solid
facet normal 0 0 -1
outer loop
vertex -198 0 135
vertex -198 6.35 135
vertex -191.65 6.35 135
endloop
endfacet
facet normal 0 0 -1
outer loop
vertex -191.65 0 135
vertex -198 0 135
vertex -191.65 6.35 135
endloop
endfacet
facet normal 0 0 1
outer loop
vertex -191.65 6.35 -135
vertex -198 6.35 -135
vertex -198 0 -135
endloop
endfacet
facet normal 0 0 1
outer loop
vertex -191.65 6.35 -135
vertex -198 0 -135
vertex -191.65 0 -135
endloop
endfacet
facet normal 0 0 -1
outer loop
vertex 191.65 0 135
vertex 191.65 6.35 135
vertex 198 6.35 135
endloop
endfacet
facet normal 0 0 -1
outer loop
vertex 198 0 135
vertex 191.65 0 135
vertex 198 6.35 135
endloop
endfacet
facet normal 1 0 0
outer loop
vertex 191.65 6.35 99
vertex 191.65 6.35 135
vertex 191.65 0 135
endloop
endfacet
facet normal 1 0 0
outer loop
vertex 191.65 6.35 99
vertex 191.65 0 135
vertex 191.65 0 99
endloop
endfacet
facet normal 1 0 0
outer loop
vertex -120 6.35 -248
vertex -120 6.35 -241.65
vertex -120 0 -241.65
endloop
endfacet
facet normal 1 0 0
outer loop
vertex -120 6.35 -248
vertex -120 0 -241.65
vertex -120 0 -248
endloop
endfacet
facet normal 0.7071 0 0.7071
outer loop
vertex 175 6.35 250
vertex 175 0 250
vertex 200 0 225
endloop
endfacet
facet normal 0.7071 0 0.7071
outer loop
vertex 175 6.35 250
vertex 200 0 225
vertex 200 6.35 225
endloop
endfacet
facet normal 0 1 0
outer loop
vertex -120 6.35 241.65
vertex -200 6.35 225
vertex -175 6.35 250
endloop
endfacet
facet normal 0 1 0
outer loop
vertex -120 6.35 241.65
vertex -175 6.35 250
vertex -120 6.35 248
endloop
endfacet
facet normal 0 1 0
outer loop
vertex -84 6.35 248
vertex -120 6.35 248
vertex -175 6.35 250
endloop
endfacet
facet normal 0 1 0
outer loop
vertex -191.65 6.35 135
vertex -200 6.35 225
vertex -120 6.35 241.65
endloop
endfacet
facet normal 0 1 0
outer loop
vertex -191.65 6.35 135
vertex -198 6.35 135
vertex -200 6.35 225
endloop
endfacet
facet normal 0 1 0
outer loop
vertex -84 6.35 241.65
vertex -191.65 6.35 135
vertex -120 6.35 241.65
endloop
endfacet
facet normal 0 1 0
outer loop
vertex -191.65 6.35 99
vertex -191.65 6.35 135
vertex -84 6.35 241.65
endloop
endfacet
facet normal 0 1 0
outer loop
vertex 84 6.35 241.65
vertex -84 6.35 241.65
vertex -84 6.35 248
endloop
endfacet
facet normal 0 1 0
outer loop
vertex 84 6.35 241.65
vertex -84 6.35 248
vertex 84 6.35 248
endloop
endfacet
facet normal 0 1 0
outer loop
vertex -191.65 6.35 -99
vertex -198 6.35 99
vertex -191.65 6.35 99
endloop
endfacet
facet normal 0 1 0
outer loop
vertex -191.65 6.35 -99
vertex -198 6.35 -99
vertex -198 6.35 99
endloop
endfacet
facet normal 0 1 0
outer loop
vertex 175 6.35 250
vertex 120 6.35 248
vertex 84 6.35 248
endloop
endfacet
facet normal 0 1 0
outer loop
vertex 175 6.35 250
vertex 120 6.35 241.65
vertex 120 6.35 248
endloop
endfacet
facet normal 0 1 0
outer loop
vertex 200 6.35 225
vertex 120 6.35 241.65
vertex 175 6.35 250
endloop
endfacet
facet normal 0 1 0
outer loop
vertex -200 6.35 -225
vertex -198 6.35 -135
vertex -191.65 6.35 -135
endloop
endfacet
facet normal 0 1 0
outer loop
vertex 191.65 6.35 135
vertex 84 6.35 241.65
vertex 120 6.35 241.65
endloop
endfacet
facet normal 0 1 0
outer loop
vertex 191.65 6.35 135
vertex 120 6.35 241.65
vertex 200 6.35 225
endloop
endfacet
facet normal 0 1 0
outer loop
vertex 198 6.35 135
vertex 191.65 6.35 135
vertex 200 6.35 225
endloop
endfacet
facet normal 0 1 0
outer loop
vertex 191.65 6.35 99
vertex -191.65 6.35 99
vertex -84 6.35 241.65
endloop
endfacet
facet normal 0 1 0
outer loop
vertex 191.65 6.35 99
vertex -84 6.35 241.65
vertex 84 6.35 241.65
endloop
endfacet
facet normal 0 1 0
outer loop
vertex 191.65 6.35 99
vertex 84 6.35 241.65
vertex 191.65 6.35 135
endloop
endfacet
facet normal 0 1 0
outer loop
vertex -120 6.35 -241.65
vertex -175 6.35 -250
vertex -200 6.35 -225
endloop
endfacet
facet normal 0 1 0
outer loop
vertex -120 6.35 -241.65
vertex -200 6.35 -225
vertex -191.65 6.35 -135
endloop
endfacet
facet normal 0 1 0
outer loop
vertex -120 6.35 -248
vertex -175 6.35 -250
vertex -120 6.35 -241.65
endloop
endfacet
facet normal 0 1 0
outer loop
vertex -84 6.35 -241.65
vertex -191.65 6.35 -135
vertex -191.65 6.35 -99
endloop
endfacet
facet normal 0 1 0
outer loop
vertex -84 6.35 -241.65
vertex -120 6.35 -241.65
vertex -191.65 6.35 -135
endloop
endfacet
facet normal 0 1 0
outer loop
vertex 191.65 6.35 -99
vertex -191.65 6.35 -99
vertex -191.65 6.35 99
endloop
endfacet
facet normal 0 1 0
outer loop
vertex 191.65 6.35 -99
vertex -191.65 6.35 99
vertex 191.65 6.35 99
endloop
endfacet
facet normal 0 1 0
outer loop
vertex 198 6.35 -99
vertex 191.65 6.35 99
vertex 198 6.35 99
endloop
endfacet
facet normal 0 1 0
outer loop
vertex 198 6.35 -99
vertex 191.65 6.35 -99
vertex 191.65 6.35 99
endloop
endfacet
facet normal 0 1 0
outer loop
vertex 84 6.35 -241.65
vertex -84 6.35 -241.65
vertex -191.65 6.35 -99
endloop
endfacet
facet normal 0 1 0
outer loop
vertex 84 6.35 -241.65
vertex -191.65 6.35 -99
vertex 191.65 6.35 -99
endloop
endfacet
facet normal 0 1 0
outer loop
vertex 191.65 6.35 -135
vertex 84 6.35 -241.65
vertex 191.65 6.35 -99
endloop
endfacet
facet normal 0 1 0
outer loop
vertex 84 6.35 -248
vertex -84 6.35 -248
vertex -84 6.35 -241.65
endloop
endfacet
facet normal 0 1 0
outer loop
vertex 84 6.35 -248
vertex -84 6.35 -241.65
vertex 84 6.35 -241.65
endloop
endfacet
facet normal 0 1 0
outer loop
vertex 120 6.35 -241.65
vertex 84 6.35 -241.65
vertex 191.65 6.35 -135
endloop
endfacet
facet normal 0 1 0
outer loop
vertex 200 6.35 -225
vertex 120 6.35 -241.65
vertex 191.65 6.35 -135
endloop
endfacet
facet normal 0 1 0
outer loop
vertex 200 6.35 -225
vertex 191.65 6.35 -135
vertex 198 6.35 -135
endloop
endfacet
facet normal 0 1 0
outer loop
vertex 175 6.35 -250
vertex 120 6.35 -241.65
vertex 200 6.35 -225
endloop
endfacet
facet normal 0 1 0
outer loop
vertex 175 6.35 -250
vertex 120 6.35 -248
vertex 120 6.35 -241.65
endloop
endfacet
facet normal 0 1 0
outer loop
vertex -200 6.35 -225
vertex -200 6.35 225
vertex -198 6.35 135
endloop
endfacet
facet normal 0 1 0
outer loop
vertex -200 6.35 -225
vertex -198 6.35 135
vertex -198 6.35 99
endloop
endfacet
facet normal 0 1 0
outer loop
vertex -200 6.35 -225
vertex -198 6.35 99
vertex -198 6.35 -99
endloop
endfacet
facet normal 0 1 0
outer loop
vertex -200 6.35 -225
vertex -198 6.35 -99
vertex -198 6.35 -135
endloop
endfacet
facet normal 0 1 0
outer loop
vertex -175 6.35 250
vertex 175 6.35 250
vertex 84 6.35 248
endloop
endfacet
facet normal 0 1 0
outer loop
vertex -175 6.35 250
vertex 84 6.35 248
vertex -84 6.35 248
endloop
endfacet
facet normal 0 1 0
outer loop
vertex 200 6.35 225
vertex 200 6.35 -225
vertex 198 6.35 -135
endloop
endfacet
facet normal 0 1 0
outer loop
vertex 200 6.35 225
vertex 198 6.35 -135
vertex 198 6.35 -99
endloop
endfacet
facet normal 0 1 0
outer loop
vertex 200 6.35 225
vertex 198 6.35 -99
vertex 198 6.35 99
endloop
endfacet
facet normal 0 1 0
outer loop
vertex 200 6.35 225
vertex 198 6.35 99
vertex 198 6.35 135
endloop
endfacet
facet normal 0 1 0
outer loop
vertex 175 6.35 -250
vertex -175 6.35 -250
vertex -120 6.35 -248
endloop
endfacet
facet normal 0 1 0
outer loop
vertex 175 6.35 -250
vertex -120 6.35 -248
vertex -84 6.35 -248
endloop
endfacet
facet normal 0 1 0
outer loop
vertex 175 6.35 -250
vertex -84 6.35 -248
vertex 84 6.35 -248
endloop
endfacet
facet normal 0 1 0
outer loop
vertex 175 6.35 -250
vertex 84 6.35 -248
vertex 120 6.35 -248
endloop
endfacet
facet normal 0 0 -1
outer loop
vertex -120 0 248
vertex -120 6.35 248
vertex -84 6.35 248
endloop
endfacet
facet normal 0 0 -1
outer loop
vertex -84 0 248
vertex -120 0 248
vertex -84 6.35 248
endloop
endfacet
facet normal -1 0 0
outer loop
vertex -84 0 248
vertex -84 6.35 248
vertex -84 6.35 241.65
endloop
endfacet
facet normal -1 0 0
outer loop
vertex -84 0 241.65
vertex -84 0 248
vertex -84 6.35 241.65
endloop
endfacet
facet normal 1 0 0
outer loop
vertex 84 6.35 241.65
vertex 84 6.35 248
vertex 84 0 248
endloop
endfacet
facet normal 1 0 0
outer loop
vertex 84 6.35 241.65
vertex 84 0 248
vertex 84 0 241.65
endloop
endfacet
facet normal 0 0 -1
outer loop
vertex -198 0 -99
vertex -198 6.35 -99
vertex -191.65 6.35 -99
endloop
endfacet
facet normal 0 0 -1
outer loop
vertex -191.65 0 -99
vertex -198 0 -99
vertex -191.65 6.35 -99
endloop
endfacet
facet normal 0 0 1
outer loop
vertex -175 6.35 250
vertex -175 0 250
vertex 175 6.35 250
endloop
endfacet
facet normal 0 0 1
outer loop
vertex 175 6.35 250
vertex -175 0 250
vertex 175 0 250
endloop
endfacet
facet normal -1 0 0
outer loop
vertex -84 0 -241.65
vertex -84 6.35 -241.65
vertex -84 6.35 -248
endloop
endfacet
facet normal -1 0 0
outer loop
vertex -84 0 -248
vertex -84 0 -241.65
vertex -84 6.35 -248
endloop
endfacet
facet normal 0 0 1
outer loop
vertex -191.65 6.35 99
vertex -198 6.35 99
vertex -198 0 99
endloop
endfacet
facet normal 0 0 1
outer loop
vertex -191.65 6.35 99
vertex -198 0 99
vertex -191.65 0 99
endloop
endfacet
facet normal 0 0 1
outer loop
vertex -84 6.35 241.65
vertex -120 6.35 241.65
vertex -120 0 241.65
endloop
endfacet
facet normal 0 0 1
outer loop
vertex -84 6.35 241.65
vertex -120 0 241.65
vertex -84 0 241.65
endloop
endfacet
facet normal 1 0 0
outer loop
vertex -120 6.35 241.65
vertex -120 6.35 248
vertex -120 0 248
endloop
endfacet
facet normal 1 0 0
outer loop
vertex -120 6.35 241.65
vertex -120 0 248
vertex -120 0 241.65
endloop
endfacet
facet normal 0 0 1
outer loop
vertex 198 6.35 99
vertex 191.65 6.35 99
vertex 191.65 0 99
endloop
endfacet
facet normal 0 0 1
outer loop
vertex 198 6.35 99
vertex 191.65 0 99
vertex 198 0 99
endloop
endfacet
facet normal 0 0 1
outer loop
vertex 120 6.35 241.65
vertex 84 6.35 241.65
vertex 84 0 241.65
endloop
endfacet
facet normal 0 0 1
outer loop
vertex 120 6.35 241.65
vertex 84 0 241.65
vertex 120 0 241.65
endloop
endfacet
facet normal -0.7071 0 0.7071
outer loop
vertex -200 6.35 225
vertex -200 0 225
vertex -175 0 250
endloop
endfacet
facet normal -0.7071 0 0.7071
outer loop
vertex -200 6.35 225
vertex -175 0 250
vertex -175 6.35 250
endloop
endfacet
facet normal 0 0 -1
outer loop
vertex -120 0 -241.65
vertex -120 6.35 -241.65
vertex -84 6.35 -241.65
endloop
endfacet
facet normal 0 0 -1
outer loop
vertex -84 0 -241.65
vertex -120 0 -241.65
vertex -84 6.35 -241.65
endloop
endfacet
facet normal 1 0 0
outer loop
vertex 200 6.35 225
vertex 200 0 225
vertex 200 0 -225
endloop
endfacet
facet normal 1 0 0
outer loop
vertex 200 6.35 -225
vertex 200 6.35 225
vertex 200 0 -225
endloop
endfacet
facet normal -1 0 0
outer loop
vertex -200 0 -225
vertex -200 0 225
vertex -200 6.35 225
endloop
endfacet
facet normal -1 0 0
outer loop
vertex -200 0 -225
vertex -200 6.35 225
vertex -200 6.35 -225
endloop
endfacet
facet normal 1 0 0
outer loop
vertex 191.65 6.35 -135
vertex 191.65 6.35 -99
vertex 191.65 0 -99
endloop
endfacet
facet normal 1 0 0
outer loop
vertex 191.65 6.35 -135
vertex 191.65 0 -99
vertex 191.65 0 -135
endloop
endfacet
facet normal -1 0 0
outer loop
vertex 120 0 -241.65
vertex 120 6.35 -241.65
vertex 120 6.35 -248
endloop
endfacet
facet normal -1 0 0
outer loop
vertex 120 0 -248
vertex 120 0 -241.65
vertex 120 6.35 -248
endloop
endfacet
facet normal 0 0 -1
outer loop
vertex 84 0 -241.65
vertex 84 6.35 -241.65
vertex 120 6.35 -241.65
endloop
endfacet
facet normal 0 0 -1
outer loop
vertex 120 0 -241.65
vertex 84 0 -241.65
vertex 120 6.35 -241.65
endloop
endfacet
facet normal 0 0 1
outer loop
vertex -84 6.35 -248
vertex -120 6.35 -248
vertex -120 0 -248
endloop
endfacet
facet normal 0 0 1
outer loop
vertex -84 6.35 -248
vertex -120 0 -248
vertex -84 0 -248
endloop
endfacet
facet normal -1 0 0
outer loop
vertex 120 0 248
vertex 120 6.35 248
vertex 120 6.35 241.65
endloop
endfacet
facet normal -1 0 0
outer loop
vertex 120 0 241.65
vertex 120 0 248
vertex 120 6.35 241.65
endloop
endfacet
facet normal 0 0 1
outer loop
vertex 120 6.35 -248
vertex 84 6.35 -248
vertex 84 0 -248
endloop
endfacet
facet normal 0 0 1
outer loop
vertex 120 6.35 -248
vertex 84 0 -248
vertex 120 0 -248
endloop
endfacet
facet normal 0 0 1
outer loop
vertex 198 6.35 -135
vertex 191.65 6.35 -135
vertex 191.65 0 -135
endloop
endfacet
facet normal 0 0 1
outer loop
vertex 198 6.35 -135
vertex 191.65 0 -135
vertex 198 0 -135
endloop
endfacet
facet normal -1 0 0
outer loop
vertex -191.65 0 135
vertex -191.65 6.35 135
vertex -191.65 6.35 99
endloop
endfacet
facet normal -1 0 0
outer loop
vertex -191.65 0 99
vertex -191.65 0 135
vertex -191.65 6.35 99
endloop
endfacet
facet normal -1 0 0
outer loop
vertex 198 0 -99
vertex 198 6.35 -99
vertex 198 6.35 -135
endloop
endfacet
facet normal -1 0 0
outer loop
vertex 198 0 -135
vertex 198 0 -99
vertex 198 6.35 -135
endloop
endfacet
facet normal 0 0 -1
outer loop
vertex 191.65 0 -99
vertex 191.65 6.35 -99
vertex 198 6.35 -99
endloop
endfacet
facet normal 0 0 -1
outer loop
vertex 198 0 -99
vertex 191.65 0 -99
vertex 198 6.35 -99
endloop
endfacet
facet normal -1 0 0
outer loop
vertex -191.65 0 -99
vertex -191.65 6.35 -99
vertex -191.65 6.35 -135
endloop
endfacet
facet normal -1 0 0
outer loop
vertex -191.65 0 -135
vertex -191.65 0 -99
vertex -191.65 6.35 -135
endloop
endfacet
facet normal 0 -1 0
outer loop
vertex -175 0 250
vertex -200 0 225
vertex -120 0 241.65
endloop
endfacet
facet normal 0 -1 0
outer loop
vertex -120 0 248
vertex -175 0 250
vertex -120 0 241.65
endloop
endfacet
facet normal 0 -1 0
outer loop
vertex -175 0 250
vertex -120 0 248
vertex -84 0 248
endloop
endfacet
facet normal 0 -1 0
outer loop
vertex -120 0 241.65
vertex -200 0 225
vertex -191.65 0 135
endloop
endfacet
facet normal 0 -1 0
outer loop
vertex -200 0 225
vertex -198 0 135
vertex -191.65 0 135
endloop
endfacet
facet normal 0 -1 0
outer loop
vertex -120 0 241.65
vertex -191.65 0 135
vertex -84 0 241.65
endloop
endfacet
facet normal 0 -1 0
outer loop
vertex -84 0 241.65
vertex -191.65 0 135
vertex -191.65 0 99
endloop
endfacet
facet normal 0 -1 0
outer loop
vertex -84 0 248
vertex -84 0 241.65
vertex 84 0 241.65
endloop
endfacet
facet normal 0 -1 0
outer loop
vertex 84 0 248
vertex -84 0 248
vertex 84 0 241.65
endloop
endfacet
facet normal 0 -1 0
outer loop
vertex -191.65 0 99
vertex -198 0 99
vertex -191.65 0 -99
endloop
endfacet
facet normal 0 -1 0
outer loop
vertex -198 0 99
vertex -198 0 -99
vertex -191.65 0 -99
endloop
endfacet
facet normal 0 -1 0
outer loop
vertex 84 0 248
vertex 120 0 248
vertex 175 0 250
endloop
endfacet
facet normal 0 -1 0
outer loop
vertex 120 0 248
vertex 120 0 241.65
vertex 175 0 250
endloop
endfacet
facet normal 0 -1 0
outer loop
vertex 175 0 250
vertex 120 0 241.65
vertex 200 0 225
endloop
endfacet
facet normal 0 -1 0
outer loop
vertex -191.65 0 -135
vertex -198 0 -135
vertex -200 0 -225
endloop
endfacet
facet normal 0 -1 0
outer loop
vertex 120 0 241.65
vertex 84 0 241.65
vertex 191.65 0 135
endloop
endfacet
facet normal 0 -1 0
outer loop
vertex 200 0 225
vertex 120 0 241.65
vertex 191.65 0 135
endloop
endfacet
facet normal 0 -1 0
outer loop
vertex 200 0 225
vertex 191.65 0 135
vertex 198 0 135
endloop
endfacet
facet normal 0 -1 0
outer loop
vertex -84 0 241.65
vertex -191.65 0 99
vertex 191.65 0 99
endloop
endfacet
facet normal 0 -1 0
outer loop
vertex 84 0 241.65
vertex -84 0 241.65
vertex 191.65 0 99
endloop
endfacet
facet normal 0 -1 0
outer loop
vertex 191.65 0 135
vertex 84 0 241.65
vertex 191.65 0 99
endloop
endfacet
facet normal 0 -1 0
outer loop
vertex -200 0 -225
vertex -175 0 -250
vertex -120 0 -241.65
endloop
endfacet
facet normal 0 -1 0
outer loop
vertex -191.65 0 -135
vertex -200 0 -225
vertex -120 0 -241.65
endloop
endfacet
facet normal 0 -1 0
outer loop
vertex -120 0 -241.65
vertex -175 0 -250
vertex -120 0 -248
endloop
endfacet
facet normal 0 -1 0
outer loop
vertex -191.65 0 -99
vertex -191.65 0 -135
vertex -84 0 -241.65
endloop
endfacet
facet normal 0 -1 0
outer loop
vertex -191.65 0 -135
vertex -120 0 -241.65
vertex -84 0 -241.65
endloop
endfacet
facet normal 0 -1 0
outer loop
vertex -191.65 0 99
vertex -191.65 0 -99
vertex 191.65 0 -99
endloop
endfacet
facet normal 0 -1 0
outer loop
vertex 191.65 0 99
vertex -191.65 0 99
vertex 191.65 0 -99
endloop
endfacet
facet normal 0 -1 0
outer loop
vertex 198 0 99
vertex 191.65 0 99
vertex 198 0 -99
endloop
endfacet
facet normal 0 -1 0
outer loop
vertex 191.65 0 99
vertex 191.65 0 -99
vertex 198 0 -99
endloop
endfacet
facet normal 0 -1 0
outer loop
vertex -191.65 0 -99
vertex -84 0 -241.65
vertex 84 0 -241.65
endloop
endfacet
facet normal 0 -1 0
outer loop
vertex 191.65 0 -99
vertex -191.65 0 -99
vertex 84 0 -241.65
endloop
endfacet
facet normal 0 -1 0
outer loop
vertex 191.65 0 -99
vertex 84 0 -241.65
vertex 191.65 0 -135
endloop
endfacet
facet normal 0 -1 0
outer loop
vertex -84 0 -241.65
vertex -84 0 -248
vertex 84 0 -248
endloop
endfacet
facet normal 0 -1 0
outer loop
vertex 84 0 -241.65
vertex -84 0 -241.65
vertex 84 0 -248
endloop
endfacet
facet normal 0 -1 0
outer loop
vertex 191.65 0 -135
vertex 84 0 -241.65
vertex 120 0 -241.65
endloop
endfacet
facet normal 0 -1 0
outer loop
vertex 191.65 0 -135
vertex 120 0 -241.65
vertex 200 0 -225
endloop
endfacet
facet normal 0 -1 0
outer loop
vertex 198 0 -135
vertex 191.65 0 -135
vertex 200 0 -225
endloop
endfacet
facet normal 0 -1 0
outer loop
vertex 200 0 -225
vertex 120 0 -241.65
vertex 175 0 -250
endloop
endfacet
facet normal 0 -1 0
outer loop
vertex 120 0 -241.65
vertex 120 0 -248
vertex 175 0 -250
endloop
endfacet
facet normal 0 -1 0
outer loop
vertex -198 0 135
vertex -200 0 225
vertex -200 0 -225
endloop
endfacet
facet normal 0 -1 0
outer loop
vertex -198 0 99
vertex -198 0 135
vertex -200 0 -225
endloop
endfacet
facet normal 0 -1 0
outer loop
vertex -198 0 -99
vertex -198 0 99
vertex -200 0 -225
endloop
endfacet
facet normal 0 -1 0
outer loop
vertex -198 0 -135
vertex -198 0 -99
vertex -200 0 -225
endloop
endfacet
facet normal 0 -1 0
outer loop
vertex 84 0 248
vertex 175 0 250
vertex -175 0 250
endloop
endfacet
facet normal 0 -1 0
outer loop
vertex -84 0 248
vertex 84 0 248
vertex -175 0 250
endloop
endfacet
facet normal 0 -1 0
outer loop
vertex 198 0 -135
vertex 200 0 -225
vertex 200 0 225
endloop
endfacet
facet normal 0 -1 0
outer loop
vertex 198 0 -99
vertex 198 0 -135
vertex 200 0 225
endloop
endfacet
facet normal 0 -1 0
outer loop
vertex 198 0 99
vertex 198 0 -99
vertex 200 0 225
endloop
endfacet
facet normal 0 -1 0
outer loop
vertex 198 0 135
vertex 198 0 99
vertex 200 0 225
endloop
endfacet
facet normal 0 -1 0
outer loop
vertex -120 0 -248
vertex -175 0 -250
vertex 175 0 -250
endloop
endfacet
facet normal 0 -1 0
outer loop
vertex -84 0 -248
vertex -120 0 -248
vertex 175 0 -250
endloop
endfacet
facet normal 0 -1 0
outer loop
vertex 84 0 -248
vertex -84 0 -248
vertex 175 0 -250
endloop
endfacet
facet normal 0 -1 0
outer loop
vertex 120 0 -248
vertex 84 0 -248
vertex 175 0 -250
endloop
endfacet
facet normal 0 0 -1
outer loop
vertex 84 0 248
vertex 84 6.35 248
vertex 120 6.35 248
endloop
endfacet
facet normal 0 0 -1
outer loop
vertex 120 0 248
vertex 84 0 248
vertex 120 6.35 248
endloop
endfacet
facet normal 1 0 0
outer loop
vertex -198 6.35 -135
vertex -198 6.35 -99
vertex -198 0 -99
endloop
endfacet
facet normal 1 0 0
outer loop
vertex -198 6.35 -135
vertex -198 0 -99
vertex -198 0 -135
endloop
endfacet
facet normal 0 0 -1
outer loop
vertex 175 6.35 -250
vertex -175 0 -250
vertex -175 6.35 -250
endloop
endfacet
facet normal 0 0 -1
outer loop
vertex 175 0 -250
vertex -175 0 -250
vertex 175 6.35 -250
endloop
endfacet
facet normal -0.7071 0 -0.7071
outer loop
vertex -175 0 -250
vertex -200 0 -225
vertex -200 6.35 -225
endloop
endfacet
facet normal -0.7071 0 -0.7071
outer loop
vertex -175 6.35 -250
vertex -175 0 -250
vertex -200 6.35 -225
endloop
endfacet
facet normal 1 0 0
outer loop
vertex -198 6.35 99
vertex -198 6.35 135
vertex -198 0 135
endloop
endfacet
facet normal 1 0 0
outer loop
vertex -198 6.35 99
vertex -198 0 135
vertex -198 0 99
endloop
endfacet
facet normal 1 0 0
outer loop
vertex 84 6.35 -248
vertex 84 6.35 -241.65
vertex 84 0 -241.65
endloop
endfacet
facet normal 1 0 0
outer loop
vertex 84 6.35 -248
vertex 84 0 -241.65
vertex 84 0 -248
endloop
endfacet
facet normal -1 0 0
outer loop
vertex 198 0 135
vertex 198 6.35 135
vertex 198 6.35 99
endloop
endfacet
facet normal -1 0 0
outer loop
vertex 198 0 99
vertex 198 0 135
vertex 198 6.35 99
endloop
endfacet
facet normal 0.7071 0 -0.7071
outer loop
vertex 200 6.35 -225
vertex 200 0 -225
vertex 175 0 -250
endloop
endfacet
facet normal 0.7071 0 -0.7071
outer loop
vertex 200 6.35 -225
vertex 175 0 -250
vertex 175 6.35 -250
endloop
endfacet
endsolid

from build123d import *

# Parameters (mm, degrees)
SKETCH2_W           = 400
SKETCH2_H           = 500
BOSS_EXTRUDE2_DEPTH = 6.35
CHAMFER1_SIZE       = 25
SKETCH9_W           = 6.35
SKETCH9_H           = 36
SKETCH9_W_2         = 36
SKETCH9_H_2         = 6.35
CUT_EXTRUDE1_DEPTH  = 321.219178845


with BuildPart() as part:
    # Sketch2 → Boss-Extrude2 (new body)
    with BuildSketch(Plane(origin=(0, 0, 0), x_dir=(1, 0, 0), z_dir=(0, 1, 0))):
        Rectangle(SKETCH2_W, SKETCH2_H)
    extrude(amount=BOSS_EXTRUDE2_DEPTH)

    # Chamfer1
    chamfer1_edges = [part.edges().sort_by_distance(p)[0] for p in [
        (200, 3.175, 250),
        (-200, 3.175, 250),
        (-200, 3.175, -250),
        (200, 3.175, -250),
    ]]
    chamfer(chamfer1_edges, length=CHAMFER1_SIZE)

    # Sketch9 → Cut-Extrude1 (cut, through all)
    with BuildSketch(Plane(origin=(0, 6.35, 0), x_dir=(1, 0, 0), z_dir=(0, 1, 0))):
        with Locations((194.825, 117)):
            Rectangle(SKETCH9_W, SKETCH9_H)
        with Locations((102, -244.825)):
            Rectangle(SKETCH9_W_2, SKETCH9_H_2)
        with Locations((-102, -244.825)):
            Rectangle(SKETCH9_W_2, SKETCH9_H_2)
        with Locations((-102, 244.825)):
            Rectangle(SKETCH9_W_2, SKETCH9_H_2)
        with Locations((102, 244.825)):
            Rectangle(SKETCH9_W_2, SKETCH9_H_2)
        with Locations((194.825, -117)):
            Rectangle(SKETCH9_W, SKETCH9_H)
        with Locations((-194.825, -117)):
            Rectangle(SKETCH9_W, SKETCH9_H)
        with Locations((-194.825, 117)):
            Rectangle(SKETCH9_W, SKETCH9_H)
    extrude(amount=-CUT_EXTRUDE1_DEPTH, mode=Mode.SUBTRACT)


solid = part.part
